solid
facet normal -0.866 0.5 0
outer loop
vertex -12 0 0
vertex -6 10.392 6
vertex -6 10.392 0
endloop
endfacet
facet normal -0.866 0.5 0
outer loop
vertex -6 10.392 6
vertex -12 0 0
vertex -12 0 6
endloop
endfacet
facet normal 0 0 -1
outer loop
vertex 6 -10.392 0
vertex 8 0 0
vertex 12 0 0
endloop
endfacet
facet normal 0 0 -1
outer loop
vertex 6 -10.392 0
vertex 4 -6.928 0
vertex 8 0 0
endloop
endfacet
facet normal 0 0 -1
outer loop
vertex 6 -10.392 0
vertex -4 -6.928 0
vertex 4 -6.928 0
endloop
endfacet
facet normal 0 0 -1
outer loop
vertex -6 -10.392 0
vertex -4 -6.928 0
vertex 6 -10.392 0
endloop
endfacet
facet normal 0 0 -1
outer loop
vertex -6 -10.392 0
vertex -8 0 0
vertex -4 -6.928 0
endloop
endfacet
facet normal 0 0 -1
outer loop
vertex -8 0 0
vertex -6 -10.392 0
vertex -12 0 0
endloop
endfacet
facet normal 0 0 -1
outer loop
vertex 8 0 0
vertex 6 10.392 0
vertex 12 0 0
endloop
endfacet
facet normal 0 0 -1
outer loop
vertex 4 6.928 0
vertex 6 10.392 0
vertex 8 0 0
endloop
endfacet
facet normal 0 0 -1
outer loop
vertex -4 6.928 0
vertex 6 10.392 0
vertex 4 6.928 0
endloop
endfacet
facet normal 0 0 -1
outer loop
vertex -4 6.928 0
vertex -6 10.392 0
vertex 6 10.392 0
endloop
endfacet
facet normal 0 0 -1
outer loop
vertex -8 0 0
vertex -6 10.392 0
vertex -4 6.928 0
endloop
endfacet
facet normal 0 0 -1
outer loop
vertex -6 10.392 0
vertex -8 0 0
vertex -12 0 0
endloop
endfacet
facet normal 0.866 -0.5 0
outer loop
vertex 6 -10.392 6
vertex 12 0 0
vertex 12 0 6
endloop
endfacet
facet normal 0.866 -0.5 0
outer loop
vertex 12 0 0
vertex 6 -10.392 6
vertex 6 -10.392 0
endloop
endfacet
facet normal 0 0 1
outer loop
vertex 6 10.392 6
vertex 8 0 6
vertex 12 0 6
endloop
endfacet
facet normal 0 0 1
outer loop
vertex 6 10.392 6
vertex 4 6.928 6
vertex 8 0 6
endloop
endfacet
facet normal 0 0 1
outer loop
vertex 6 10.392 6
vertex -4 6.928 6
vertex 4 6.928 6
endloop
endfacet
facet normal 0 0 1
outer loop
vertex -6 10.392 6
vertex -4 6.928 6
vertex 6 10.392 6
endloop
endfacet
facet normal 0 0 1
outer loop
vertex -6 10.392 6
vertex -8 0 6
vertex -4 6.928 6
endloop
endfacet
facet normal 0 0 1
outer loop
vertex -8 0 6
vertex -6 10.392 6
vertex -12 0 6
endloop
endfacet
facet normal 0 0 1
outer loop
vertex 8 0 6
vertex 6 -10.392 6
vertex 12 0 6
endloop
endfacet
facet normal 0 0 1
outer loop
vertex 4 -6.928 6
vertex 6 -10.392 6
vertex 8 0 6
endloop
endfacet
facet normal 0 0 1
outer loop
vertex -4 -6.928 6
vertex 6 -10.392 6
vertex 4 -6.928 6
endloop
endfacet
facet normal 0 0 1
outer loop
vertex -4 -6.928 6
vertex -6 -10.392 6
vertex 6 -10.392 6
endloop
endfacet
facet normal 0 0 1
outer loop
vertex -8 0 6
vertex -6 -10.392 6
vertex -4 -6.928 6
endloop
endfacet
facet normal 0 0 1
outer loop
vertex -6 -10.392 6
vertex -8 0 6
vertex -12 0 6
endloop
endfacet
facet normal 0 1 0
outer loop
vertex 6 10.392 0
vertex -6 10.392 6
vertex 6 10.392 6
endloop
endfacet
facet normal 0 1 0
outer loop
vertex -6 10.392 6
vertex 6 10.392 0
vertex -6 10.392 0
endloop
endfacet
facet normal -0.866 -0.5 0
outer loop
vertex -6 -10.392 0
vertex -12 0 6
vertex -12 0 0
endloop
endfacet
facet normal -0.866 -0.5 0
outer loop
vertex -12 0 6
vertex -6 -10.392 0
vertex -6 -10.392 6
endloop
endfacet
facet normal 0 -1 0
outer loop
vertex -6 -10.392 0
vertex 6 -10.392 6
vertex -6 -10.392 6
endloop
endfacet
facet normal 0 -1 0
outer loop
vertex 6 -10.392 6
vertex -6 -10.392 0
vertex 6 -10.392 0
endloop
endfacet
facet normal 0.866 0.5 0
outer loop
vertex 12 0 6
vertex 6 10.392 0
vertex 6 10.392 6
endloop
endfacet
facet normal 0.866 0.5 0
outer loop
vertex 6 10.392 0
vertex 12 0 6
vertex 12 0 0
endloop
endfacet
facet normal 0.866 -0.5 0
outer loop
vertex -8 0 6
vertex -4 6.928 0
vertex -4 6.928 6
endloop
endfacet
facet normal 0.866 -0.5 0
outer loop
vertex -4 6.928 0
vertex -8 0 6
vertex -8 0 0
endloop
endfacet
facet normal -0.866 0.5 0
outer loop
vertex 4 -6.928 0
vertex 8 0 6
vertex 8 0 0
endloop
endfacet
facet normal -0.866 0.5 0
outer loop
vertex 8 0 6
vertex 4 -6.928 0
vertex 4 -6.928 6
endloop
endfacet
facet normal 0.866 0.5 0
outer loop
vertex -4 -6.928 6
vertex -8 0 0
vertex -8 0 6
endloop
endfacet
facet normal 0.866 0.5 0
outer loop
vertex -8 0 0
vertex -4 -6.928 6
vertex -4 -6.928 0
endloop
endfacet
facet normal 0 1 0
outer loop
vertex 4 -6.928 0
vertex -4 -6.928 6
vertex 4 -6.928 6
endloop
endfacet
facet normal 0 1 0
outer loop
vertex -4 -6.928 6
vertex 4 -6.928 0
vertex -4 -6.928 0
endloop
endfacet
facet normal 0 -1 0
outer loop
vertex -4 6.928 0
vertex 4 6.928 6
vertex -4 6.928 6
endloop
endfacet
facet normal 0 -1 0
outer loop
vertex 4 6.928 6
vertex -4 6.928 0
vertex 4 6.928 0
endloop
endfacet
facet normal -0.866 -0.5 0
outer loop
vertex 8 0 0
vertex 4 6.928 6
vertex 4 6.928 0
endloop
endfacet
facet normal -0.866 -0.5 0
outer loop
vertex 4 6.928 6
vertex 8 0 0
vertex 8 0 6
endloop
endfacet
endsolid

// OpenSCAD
$fn = 50;

difference() {
	union() {
		difference() {
			linear_extrude(height = 6) {
				polygon(points = [[12.0, 0.0], [6.000000000000002, 10.392304845413264], [-5.999999999999997, 10.392304845413264], [-12.0, 1.4695761589768238e-15], [-6.000000000000005, -10.392304845413262], [5.999999999999992, -10.392304845413268]]);
			}
			linear_extrude(height = 6) {
				polygon(points = [[8.0, 0.0], [4.000000000000001, 6.928203230275509], [-3.9999999999999982, 6.92820323027551], [-8.0, 9.797174393178826e-16], [-4.0000000000000036, -6.928203230275508], [3.9999999999999947, -6.928203230275512]]);
			}
		}
	}
	union();
}
